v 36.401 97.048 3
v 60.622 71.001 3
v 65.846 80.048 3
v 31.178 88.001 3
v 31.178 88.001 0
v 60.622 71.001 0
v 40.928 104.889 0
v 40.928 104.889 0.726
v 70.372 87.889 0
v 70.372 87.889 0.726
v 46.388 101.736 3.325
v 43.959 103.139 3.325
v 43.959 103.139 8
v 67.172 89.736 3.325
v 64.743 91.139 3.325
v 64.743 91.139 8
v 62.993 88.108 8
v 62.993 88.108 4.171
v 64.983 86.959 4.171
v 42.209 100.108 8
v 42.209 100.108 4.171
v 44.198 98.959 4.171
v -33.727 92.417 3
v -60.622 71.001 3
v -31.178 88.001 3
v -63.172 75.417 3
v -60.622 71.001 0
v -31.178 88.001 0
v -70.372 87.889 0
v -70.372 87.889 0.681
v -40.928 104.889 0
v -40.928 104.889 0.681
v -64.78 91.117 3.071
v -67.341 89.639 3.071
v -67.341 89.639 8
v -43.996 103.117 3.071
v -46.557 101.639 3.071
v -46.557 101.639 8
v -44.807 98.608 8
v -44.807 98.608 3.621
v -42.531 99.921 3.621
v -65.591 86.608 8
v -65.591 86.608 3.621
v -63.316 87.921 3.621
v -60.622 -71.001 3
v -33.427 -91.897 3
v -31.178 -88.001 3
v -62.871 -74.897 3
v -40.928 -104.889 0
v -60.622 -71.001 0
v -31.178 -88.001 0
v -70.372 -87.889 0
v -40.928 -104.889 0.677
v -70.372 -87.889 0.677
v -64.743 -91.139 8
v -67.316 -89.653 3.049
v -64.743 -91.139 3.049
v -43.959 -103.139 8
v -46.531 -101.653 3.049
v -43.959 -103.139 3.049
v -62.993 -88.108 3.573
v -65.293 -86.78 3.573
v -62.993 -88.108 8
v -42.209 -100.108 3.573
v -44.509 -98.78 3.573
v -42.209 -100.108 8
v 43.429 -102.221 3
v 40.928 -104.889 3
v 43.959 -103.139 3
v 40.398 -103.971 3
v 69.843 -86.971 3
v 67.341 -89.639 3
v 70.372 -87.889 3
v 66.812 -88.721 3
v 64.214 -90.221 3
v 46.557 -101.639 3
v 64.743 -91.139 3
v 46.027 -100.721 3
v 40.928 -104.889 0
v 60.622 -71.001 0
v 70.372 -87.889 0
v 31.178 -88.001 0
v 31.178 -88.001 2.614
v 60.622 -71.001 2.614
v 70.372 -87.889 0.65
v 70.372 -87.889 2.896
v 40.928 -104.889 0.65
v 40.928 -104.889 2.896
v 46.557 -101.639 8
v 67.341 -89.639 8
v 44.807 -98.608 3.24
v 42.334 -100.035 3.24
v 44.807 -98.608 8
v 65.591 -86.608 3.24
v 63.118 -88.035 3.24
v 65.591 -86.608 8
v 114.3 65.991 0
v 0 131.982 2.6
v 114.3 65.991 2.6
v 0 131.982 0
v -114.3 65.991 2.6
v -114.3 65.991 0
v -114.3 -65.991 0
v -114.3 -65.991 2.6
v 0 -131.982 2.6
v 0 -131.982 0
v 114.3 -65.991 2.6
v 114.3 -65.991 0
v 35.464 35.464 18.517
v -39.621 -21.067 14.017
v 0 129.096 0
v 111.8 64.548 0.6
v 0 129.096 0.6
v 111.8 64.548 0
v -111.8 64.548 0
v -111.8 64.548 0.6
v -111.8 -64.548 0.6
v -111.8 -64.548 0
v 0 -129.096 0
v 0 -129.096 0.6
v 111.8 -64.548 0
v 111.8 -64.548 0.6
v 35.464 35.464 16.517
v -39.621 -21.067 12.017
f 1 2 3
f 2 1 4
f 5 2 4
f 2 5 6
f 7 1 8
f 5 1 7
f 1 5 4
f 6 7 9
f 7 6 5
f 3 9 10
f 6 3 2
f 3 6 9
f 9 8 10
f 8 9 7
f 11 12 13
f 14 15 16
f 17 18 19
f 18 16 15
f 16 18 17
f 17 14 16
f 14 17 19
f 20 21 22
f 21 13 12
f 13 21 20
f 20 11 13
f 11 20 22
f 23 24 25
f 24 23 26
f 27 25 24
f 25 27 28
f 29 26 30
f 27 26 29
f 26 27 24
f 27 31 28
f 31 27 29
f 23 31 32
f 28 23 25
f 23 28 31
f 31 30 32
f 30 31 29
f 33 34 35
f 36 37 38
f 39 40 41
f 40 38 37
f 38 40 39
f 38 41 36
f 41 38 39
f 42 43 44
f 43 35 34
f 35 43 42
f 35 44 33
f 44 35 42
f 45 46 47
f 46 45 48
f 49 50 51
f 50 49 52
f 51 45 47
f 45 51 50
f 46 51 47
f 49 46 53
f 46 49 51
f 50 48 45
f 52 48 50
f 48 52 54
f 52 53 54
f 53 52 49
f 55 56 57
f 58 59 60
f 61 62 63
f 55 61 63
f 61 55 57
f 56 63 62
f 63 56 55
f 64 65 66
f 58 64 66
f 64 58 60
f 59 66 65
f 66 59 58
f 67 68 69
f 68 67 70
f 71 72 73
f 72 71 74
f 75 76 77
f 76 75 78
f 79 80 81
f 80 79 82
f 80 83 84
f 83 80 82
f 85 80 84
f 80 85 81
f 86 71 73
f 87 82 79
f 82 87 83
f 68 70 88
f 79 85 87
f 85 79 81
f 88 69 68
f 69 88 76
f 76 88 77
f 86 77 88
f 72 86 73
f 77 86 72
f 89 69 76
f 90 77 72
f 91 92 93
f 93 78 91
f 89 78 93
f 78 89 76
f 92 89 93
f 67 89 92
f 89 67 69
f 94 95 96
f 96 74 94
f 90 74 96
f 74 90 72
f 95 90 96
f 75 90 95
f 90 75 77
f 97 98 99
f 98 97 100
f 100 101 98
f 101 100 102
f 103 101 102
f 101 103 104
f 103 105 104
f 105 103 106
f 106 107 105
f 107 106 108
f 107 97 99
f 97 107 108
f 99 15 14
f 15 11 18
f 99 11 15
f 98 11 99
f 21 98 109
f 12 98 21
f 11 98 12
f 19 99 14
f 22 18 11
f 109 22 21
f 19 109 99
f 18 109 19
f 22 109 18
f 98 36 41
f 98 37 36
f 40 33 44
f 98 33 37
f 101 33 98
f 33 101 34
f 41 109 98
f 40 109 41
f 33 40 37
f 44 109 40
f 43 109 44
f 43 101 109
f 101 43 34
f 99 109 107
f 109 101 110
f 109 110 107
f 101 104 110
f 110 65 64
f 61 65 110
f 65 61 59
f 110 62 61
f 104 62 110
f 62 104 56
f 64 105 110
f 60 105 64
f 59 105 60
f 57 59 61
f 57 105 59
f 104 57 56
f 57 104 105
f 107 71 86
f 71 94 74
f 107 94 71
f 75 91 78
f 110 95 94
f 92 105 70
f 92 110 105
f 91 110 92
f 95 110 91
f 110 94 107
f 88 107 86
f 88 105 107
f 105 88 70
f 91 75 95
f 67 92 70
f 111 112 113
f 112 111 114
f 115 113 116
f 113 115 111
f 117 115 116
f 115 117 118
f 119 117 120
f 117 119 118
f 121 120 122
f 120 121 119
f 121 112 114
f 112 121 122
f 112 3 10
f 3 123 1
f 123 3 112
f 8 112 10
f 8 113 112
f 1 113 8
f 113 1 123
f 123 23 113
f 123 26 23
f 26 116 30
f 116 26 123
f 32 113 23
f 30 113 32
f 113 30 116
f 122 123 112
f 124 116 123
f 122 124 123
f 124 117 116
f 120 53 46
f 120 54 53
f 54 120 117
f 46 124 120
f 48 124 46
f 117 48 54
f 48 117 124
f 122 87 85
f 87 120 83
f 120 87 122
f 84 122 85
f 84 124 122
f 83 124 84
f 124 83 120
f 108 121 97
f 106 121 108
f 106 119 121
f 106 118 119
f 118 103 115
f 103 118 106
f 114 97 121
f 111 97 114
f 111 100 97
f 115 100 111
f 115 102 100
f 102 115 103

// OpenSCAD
/*
    parametric_faceted_hex_wall_tile_mount_v20.scad
    ------------------------------------------------------------
    Improved asymmetric low-poly hex wall tile.

    Major v20 changes
    -----------------
    1. Simplified thickness controls.
       - shell_thickness_mm controls the faceted front skin.
       - perimeter_wall_thickness_mm controls the outside rim.
       - mount_pad_thickness_mm controls mounting-tab thickness.

    2. Thicker shells now work automatically.
       The effective edge height is automatically raised when required
       so shell_thickness_mm is never blocked by a too-small edge height.

    3. Mounting pads cannot protrude outside the hexagon.
       Pads are intersected with a smaller inset hex footprint.

    4. Stronger default mounting geometry.
       - 3.0 mm pad thickness
       - 4.0 mm shell overlap
       - 3.0 mm edge inset
       - optional reinforcing ribs

    5. Open back remains truly open.
       There is no rear floor across the middle.

    Recommended use
    ---------------
    For a 9-inch decorative wall tile printed vertically:

        shell_thickness_mm          = 2.0;
        perimeter_wall_thickness_mm = 2.5;
        mount_pad_thickness_mm      = 3.0;
        mount_pad_overlap_mm        = 4.0;
        mount_pad_edge_inset_mm     = 3.0;
        add_mount_ribs              = true;

    Export
    ------
    F6 Render
    File -> Export -> Export as STL
*/


// =============================================================================
// CUSTOMIZER PARAMETERS
// =============================================================================


/* [Tile Size] */

// Which dimension tile_size represents.
size_reference = "flat_to_flat";     // [flat_to_flat, across_corners]

// Units for tile_size.
size_units = "mm";                   // [mm, in]

// Examples:
// 152.4 = 6"
// 203.2 = 8"
// 228.6 = 9"
// 254.0 = 10"
tile_size = 228.6;

// Rotate finished tile around Z.
tile_rotation_deg = 0;


/* [Main Strength] */

// Thickness of the faceted FRONT shell.
//
// This is the main control if the tile itself feels too thin.
//
// Recommended:
// 1.2 = lightweight
// 1.6 = medium
// 2.0 = strong / recommended
// 2.4 = very strong
shell_thickness_mm = 2.0;

// Thickness of the OUTER perimeter/rim.
//
// Recommended:
// 1.8 = medium
// 2.5 = strong / recommended
// 3.0 = very strong
perimeter_wall_thickness_mm = 2.5;


/* [Front Relief] */

// proportional = scales with tile size
// absolute     = exact millimeter heights below
relief_height_mode = "proportional";    // [proportional, absolute]

// Overall relief multiplier.
relief_scale = 1.0;

// Main peak height relative to flat-to-flat size.
peak_height_ratio = 0.081;

// Ridge height relative to peak.
ridge_to_peak_ratio = 0.757;

// Requested outer edge height relative to peak.
//
// IMPORTANT:
// v20 automatically raises edge height if necessary to fit the selected
// shell_thickness_mm. You normally do NOT need to change this anymore.
edge_to_peak_ratio = 0.097;

// Absolute values, used only in absolute mode.
peak_height_mm  = 18.5;
ridge_height_mm = 14.0;
edge_height_mm  = 1.8;

// Minimum empty clearance between the inner roof and Z=0 at the perimeter.
//
// v20 uses:
// effective_edge_height >= shell_thickness_mm + edge_clearance_mm
edge_clearance_mm = 0.60;


/* [Facet Layout] */

// Direction of main peak, CCW from +X.
peak_angle_deg = 45;

// Peak distance from center as a fraction of circumradius.
peak_radius_ratio = 0.38;

// Direction of secondary ridge.
ridge_angle_deg = 208;

// Ridge radial position.
ridge_radius_ratio = 0.34;


/* [Wall Mounting] */

// Enable mounting pads.
add_mount_pads = true;

// Width of each pad parallel to the corresponding hex side.
mount_pad_width_mm = 34.0;

// Radial depth of each pad.
mount_pad_depth_mm = 24.0;

// Thickness of the mounting tabs.
//
// THIS is the control if the tabs themselves are too thin.
mount_pad_thickness_mm = 3.0;

// How far the pad reaches beneath the inner perimeter shell.
//
// More overlap creates a stronger pad-to-rim union.
mount_pad_overlap_mm = 4.0;

// Pull the ENTIRE usable pad footprint inward from the outside hex edge.
//
// Pads are clipped against this inset hex, so they cannot protrude outside.
mount_pad_edge_inset_mm = 3.0;

// Directions of mounting pads.
mount_pad_angles = [60, 120, 240, 300];


/* [Mount Reinforcement] */

// Add small triangular reinforcing ribs where pads meet the perimeter.
//
// Recommended ON for vertical printing.
add_mount_ribs = true;

// Rib thickness across the pad.
mount_rib_width_mm = 3.0;

// Rib height into the cavity.
mount_rib_height_mm = 5.0;

// Rib radial depth.
mount_rib_depth_mm = 8.0;


/* [Optional Screw Holes] */

add_pad_screw_holes = false;

// 3.5 ~= #6
// 4.5 ~= #8
pad_screw_hole_diameter_mm = 4.5;


/* [Advanced] */

// Polyhedron preview hint.
polyhedron_convexity = 12;

// Cylinder quality for screw holes.
screw_hole_fn = 40;


// =============================================================================
// DERIVED TILE DIMENSIONS
// =============================================================================

_tile_size_mm =
    size_units == "in"
        ? tile_size * 25.4
        : tile_size;

tile_flat_to_flat =
    size_reference == "flat_to_flat"
        ? _tile_size_mm
        : _tile_size_mm * cos(30);

tile_across_corners =
    tile_flat_to_flat / cos(30);

outer_apothem =
    tile_flat_to_flat / 2;

r_outer =
    outer_apothem / cos(30);

inner_apothem =
    outer_apothem - perimeter_wall_thickness_mm;

r_inner =
    inner_apothem / cos(30);

inner_flat_length =
    2 * inner_apothem * tan(30);

hex_side_length =
    2 * r_outer * sin(30);


// =============================================================================
// DERIVED RELIEF HEIGHTS
// =============================================================================

_peak_unscaled =
    relief_height_mode == "proportional"
        ? tile_flat_to_flat * peak_height_ratio
        : peak_height_mm;

_ridge_unscaled =
    relief_height_mode == "proportional"
        ? _peak_unscaled * ridge_to_peak_ratio
        : ridge_height_mm;

_requested_edge_unscaled =
    relief_height_mode == "proportional"
        ? _peak_unscaled * edge_to_peak_ratio
        : edge_height_mm;

peak_height =
    _peak_unscaled * relief_scale;

ridge_height =
    _ridge_unscaled * relief_scale;

requested_edge_height =
    _requested_edge_unscaled * relief_scale;

// AUTO-FIX:
// Guarantee enough vertical room for the chosen front shell thickness.
minimum_edge_height =
    shell_thickness_mm + edge_clearance_mm;

edge_height =
    max(
        requested_edge_height,
        minimum_edge_height
    );


// =============================================================================
// DERIVED MOUNTING GEOMETRY
// =============================================================================

// Desired outer edge before clipping.
//
// This allows the pad to overlap the inner wall structurally.
mount_pad_desired_outer_r =
    inner_apothem + mount_pad_overlap_mm;

mount_pad_inner_r =
    mount_pad_desired_outer_r - mount_pad_depth_mm;

mount_pad_center_r =
    mount_pad_desired_outer_r - mount_pad_depth_mm / 2;

// Smaller hex used as a hard clipping boundary.
//
// Any mount geometry outside this boundary is removed automatically.
mount_clip_apothem =
    outer_apothem - mount_pad_edge_inset_mm;

mount_clip_radius =
    mount_clip_apothem / cos(30);


// =============================================================================
// VALIDATION
// =============================================================================

assert(
    tile_flat_to_flat > 0,
    "tile_size must produce a positive tile dimension."
);

assert(
    shell_thickness_mm > 0,
    "shell_thickness_mm must be greater than zero."
);

assert(
    perimeter_wall_thickness_mm > 0,
    "perimeter_wall_thickness_mm must be greater than zero."
);

assert(
    perimeter_wall_thickness_mm < outer_apothem,
    "perimeter_wall_thickness_mm is too large for this tile."
);

assert(
    inner_apothem > 0,
    "The selected perimeter wall leaves no hollow interior."
);

assert(
    edge_height > shell_thickness_mm,
    "Internal error: edge_height must exceed shell_thickness_mm."
);

assert(
    ridge_height > edge_height,
    "ridge_height must remain greater than the effective edge height."
);

assert(
    peak_height > ridge_height,
    "peak_height must remain greater than ridge_height."
);

assert(
    peak_radius_ratio > 0 && peak_radius_ratio < 0.90,
    "peak_radius_ratio must be between 0 and 0.90."
);

assert(
    ridge_radius_ratio > 0 && ridge_radius_ratio < 0.90,
    "ridge_radius_ratio must be between 0 and 0.90."
);

assert(
    mount_pad_width_mm > 0,
    "mount_pad_width_mm must be greater than zero."
);

assert(
    mount_pad_depth_mm > 0,
    "mount_pad_depth_mm must be greater than zero."
);

assert(
    mount_pad_thickness_mm > 0,
    "mount_pad_thickness_mm must be greater than zero."
);

assert(
    mount_pad_overlap_mm >= 0,
    "mount_pad_overlap_mm cannot be negative."
);

assert(
    mount_pad_edge_inset_mm >= 0,
    "mount_pad_edge_inset_mm cannot be negative."
);

assert(
    mount_clip_apothem > 0,
    "mount_pad_edge_inset_mm is too large."
);

assert(
    mount_pad_inner_r > 0,
    "mount_pad_depth_mm is too large and reaches/passes the tile center."
);

assert(
    !add_pad_screw_holes ||
    pad_screw_hole_diameter_mm < mount_pad_width_mm * 0.75,
    "pad_screw_hole_diameter_mm is too large for the mounting pad."
);

assert(
    !add_mount_ribs ||
    mount_rib_height_mm > 0,
    "mount_rib_height_mm must be greater than zero."
);


// =============================================================================
// DIAGNOSTIC OUTPUT
// =============================================================================

echo("====================================================");
echo("FACETED HEX WALL TILE v20");
echo("====================================================");

echo(str("flat-to-flat             : ", tile_flat_to_flat, " mm"));
echo(str("across-corners           : ", tile_across_corners, " mm"));
echo(str("hex side length          : ", hex_side_length, " mm"));

echo(str("shell thickness          : ", shell_thickness_mm, " mm"));
echo(str("perimeter wall thickness : ", perimeter_wall_thickness_mm, " mm"));

echo(str("requested edge height    : ", requested_edge_height, " mm"));
echo(str("minimum edge height      : ", minimum_edge_height, " mm"));
echo(str("EFFECTIVE edge height    : ", edge_height, " mm"));

echo(str("ridge height             : ", ridge_height, " mm"));
echo(str("peak height              : ", peak_height, " mm"));

echo(str("mount pad width          : ", mount_pad_width_mm, " mm"));
echo(str("mount pad depth          : ", mount_pad_depth_mm, " mm"));
echo(str("mount pad thickness      : ", mount_pad_thickness_mm, " mm"));
echo(str("mount pad overlap        : ", mount_pad_overlap_mm, " mm"));
echo(str("mount edge inset         : ", mount_pad_edge_inset_mm, " mm"));

echo(str("mount clip apothem       : ", mount_clip_apothem, " mm"));

if (edge_height > requested_edge_height)
    echo(
        str(
            "AUTO EDGE FIX ACTIVE: edge raised from ",
            requested_edge_height,
            " mm to ",
            edge_height,
            " mm so a ",
            shell_thickness_mm,
            " mm shell fits safely."
        )
    );

echo("====================================================");


// =============================================================================
// HELPERS
// =============================================================================

function polar(angle_deg, radius) =
    [
        radius * cos(angle_deg),
        radius * sin(angle_deg)
    ];

function hex_vertex(i, radius) =
    [
        radius * cos(30 + i * 60),
        radius * sin(30 + i * 60)
    ];


// =============================================================================
// FRONT RELIEF CONTROL POINTS
// =============================================================================

P_xy =
    polar(
        peak_angle_deg,
        r_outer * peak_radius_ratio
    );

Q_xy =
    polar(
        ridge_angle_deg,
        r_outer * ridge_radius_ratio
    );


// =============================================================================
// SHELL VERTICES
// =============================================================================

points =
    concat(

        // 0..5 : outer rear perimeter
        [
            for (i = [0 : 5])
                let(p = hex_vertex(i, r_outer))
                [p[0], p[1], 0]
        ],

        // 6..11 : outer front perimeter
        [
            for (i = [0 : 5])
                let(p = hex_vertex(i, r_outer))
                [p[0], p[1], edge_height]
        ],

        // 12..13 : outer peak / ridge
        [
            [P_xy[0], P_xy[1], peak_height],
            [Q_xy[0], Q_xy[1], ridge_height]
        ],

        // 14..19 : inner rear perimeter
        [
            for (i = [0 : 5])
                let(p = hex_vertex(i, r_inner))
                [p[0], p[1], 0]
        ],

        // 20..25 : inner front perimeter
        [
            for (i = [0 : 5])
                let(p = hex_vertex(i, r_inner))
                [p[0], p[1], edge_height - shell_thickness_mm]
        ],

        // 26..27 : inner peak / ridge
        [
            [P_xy[0], P_xy[1], peak_height - shell_thickness_mm],
            [Q_xy[0], Q_xy[1], ridge_height - shell_thickness_mm]
        ]
    );


// =============================================================================
// SHELL FACES
// =============================================================================

outer_roof_faces = [
    [6, 7, 12],
    [7, 8, 12],
    [6, 12, 11],

    [8, 13, 12],
    [11, 12, 13],

    [8, 9, 13],
    [9, 10, 13],
    [10, 11, 13]
];

inner_roof_faces = [
    [26, 21, 20],
    [26, 22, 21],
    [25, 26, 20],

    [26, 27, 22],
    [27, 26, 25],

    [27, 23, 22],
    [27, 24, 23],
    [27, 25, 24]
];

faces =
    concat(

        // Outer vertical perimeter
        [
            for (i = [0 : 5])
                [
                    i,
                    (i + 1) % 6,
                    6 + (i + 1) % 6,
                    6 + i
                ]
        ],

        outer_roof_faces,

        // Inner vertical perimeter
        [
            for (i = [0 : 5])
                [
                    14 + i,
                    20 + i,
                    20 + (i + 1) % 6,
                    14 + (i + 1) % 6
                ]
        ],

        inner_roof_faces,

        // Narrow rear perimeter ring only.
        // Center remains open.
        [
            for (i = [0 : 5])
                [
                    i,
                    14 + i,
                    14 + (i + 1) % 6,
                    (i + 1) % 6
                ]
        ]
    );


// =============================================================================
// TILE SHELL
// =============================================================================

module tile_shell() {
    polyhedron(
        points = points,
        faces = faces,
        convexity = polyhedron_convexity
    );
}


// =============================================================================
// HEX FOOTPRINT USED TO CLIP MOUNTING TABS
// =============================================================================
//
// This is intentionally smaller than the visible outer hexagon.
// Therefore mount pads/ribs cannot stick out past the visible perimeter.
//

module mount_clip_volume(height_mm) {
    linear_extrude(height = height_mm)
        polygon(
            points = [
                for (i = [0 : 5])
                    hex_vertex(i, mount_clip_radius)
            ]
        );
}


// =============================================================================
// RAW MOUNT PAD
// =============================================================================

module raw_mount_pad(angle_deg) {
    rotate([0, 0, angle_deg])
        translate(
            [
                mount_pad_inner_r,
                -mount_pad_width_mm / 2,
                0
            ]
        )
            cube(
                [
                    mount_pad_depth_mm,
                    mount_pad_width_mm,
                    mount_pad_thickness_mm
                ]
            );
}


// =============================================================================
// CLIPPED MOUNT PAD
// =============================================================================

module mount_pad(angle_deg) {
    intersection() {
        raw_mount_pad(angle_deg);

        mount_clip_volume(
            mount_pad_thickness_mm + 0.01
        );
    }
}


// =============================================================================
// OPTIONAL REINFORCING RIBS
// =============================================================================
//
// Two ribs are placed near the left/right sides of each mounting pad.
//
// They rise into the cavity and help resist bending at the pad-to-shell joint.
//

module raw_mount_ribs(angle_deg) {

    rib_center_r =
        mount_pad_desired_outer_r
        - mount_rib_depth_mm / 2;

    rib_side_offset =
        max(
            0,
            mount_pad_width_mm / 2
            - mount_rib_width_mm
            - 2
        );

    rotate([0, 0, angle_deg]) {

        for (side = [-1, 1]) {

            translate(
                [
                    rib_center_r - mount_rib_depth_mm / 2,
                    side * rib_side_offset - mount_rib_width_mm / 2,
                    mount_pad_thickness_mm
                ]
            )

            rotate([90, 0, 90])

            linear_extrude(height = mount_rib_depth_mm)

            polygon(
                points = [
                    [0, 0],
                    [mount_rib_width_mm, 0],
                    [mount_rib_width_mm, mount_rib_height_mm],
                    [0, 0]
                ]
            );
        }
    }
}


module mount_ribs(angle_deg) {
    intersection() {

        raw_mount_ribs(angle_deg);

        mount_clip_volume(
            mount_pad_thickness_mm
            + mount_rib_height_mm
            + 0.1
        );
    }
}


// =============================================================================
// OPTIONAL SCREW HOLE
// =============================================================================

module pad_screw_hole(angle_deg) {

    rotate([0, 0, angle_deg])

        translate(
            [
                mount_pad_center_r,
                0,
                -1
            ]
        )

            cylinder(
                d = pad_screw_hole_diameter_mm,
                h =
                    mount_pad_thickness_mm
                    + mount_rib_height_mm
                    + 2,
                $fn = screw_hole_fn
            );
}


// =============================================================================
// COMPLETE MODEL
// =============================================================================

module model() {

    rotate([0, 0, tile_rotation_deg]) {

        difference() {

            union() {

                tile_shell();

                if (add_mount_pads) {

                    for (a = mount_pad_angles) {

                        mount_pad(a);

                        if (add_mount_ribs)
                            mount_ribs(a);
                    }
                }
            }

            if (
                add_mount_pads &&
                add_pad_screw_holes
            ) {

                for (a = mount_pad_angles)
                    pad_screw_hole(a);
            }
        }
    }
}


// =============================================================================
// OUTPUT
// =============================================================================

model();
